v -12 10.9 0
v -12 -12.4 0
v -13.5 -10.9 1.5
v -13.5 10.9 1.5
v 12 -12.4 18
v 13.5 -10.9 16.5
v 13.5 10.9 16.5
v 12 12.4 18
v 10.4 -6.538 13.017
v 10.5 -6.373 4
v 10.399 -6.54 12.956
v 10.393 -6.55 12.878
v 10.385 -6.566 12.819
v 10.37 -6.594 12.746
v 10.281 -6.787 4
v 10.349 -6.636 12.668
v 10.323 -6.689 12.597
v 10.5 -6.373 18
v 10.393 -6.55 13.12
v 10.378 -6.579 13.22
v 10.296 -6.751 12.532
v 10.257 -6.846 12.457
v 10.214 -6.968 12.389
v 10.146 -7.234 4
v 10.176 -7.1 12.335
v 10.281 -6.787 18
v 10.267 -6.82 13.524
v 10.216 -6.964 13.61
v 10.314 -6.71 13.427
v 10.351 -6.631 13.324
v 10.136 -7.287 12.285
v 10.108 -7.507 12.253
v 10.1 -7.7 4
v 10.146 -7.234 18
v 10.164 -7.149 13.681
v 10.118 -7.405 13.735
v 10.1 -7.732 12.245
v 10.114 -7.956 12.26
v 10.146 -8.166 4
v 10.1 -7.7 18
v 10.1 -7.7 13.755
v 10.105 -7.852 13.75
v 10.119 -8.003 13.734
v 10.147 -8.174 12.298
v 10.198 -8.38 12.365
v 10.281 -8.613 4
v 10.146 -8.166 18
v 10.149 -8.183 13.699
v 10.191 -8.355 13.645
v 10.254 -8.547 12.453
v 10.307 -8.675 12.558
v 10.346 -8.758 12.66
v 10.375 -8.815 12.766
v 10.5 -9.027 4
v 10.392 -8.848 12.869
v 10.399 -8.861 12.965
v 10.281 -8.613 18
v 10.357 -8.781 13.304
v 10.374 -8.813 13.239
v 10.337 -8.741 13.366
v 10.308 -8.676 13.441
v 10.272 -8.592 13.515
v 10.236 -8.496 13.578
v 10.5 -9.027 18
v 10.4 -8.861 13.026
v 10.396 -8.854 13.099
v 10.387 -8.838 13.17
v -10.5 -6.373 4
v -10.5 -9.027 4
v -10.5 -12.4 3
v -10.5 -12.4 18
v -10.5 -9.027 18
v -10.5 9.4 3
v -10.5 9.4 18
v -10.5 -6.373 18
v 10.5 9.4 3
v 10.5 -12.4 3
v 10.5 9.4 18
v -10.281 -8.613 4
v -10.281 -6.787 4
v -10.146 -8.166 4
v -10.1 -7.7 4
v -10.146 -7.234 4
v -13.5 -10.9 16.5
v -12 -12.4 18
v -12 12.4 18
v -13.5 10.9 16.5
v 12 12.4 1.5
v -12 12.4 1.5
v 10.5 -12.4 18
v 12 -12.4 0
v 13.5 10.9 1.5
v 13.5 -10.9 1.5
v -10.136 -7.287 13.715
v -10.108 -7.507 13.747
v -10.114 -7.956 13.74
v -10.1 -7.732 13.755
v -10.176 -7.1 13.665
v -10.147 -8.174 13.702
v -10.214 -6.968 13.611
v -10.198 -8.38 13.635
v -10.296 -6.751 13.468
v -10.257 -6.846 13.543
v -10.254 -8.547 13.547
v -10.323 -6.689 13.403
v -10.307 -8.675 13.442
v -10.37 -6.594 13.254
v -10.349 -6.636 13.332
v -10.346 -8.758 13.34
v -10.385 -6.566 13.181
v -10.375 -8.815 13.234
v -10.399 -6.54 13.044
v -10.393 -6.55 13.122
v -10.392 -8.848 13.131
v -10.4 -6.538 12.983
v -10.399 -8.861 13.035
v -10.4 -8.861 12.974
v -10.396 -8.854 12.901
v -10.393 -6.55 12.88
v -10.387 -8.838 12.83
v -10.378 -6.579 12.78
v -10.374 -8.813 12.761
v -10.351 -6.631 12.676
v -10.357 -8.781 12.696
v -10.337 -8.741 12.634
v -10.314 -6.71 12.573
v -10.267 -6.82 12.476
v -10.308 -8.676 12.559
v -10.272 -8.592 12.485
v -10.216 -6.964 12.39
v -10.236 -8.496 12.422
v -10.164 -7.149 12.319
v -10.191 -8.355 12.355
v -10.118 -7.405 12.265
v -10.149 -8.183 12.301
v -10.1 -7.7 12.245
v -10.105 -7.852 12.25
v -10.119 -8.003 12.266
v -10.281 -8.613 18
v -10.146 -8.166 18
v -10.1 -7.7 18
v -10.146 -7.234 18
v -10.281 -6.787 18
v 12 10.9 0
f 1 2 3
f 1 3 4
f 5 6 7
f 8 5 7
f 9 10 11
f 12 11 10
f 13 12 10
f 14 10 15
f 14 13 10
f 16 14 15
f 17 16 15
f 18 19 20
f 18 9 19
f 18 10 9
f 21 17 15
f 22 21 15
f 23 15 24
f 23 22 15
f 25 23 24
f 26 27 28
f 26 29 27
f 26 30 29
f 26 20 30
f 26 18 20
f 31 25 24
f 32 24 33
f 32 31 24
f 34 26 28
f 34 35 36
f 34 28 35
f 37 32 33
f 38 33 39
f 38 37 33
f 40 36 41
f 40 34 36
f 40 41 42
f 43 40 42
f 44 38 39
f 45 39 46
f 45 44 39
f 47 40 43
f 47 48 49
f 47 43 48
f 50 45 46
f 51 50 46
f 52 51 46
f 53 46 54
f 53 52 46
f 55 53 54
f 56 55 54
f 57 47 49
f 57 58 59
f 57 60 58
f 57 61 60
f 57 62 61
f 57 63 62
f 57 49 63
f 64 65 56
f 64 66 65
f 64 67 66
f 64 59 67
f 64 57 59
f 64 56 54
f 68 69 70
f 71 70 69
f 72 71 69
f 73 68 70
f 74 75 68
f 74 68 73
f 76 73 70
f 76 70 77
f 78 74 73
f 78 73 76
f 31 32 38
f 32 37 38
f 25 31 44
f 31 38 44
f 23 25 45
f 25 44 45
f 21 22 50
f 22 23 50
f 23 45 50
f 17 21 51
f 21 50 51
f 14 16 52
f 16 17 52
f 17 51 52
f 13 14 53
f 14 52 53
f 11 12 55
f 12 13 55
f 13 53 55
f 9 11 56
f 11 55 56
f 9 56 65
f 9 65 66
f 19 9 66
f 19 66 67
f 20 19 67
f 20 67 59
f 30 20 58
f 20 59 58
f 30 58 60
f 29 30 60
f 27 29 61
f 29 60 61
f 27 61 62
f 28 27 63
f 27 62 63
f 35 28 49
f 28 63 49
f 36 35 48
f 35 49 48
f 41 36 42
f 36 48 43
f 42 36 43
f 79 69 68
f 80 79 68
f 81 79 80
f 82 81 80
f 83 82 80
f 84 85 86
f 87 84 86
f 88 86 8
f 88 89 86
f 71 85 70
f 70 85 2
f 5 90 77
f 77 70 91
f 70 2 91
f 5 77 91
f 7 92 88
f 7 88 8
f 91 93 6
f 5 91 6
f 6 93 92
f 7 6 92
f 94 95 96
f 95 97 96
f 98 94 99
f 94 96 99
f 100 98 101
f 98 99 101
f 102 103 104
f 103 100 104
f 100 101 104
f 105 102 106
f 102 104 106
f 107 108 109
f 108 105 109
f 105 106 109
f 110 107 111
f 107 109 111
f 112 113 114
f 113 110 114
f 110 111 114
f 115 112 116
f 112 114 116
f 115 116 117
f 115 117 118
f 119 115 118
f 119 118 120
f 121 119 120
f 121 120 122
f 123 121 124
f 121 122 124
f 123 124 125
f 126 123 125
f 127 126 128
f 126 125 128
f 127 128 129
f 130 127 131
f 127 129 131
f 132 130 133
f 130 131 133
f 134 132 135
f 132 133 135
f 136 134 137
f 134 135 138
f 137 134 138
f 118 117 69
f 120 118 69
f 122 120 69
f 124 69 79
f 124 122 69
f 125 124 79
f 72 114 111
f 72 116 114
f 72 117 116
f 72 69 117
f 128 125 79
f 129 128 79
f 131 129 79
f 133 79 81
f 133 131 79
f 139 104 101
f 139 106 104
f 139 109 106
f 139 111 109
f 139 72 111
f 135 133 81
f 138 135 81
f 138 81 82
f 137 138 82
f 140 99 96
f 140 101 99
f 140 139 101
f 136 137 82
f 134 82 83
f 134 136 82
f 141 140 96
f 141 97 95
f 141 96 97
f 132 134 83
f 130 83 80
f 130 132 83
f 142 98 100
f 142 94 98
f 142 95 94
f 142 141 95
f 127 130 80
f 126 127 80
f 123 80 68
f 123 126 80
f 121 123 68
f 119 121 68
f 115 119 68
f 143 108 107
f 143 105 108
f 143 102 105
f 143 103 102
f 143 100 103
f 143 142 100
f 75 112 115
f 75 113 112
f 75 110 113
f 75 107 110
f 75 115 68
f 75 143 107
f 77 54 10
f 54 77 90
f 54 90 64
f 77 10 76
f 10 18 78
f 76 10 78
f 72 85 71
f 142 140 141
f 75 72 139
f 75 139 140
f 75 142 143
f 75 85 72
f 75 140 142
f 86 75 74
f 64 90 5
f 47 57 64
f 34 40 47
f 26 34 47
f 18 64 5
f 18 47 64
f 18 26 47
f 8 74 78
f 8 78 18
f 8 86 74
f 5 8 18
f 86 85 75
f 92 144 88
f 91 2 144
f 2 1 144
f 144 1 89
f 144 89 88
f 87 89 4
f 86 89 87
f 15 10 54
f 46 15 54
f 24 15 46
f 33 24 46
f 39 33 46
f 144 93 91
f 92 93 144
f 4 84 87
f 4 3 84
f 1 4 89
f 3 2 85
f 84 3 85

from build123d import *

# Parameters (mm, degrees)
F0_W     = 27
F0_H     = 24.8
F1_DEPTH = 18
F2_W     = 21
F2_H     = 21.8
F3_DEPTH = 15
F5_DEPTH = 14
F7_DEPTH = 10
F8_SIZE  = 1.5


with BuildPart() as f1:
    # F0 (on Top) → F1 (new body)
    with BuildSketch(Plane.XY):
        Rectangle(F0_W, F0_H)
    extrude(amount=F1_DEPTH)

    # F2 (on face) → F3 (cut)
    with BuildSketch(Plane.XY.offset(18)):
        with Locations((0, -1.5)):
            Rectangle(F2_W, F2_H)
    extrude(amount=-F3_DEPTH, mode=Mode.SUBTRACT)

    # F4 (on face) → F5 (join)
    with BuildSketch(Plane.XY.offset(18)):
        with BuildLine():
            ThreePointArc((-10.5, -9.02665), (-10.1, -7.7), (-10.5, -6.37335))
            Line((-10.5, -6.37335), (-10.5, -9.02665))
        make_face()
        with BuildLine():
            ThreePointArc((10.5, -6.37335), (10.1, -7.7), (10.5, -9.02665))
            Line((10.5, -9.02665), (10.5, -6.37335))
        make_face()
    extrude(amount=-F5_DEPTH)

    # F6 (on face) → F7 (cut)
    with BuildSketch(Plane.XZ.offset(12.4)):
        with BuildLine():
            ThreePointArc((10, 12.151472), (10.4, 13), (10, 13.848528))
            Line((10, 13.848528), (10, 12.151472))
        make_face()
        with BuildLine():
            Line((-10, 12.151472), (-10, 13.848528))
            ThreePointArc((-10, 13.848528), (-10.4, 13), (-10, 12.151472))
        make_face()
    extrude(amount=-F7_DEPTH, mode=Mode.SUBTRACT)

    # F8
    f8_edges = [f1.edges().sort_by_distance(p)[0] for p in [
        (13.5, 0, 0),
        (13.5, 0, 18),
        (-13.5, 0, 18),
        (-13.5, 0, 0),
        (-13.5, 12.4, 9),
        (0, 12.4, 0),
        (13.5, -12.4, 9),
        (-13.5, -12.4, 9),
        (13.5, 12.4, 9),
    ]]
    chamfer(f8_edges, length=F8_SIZE)


solid = f1.part
